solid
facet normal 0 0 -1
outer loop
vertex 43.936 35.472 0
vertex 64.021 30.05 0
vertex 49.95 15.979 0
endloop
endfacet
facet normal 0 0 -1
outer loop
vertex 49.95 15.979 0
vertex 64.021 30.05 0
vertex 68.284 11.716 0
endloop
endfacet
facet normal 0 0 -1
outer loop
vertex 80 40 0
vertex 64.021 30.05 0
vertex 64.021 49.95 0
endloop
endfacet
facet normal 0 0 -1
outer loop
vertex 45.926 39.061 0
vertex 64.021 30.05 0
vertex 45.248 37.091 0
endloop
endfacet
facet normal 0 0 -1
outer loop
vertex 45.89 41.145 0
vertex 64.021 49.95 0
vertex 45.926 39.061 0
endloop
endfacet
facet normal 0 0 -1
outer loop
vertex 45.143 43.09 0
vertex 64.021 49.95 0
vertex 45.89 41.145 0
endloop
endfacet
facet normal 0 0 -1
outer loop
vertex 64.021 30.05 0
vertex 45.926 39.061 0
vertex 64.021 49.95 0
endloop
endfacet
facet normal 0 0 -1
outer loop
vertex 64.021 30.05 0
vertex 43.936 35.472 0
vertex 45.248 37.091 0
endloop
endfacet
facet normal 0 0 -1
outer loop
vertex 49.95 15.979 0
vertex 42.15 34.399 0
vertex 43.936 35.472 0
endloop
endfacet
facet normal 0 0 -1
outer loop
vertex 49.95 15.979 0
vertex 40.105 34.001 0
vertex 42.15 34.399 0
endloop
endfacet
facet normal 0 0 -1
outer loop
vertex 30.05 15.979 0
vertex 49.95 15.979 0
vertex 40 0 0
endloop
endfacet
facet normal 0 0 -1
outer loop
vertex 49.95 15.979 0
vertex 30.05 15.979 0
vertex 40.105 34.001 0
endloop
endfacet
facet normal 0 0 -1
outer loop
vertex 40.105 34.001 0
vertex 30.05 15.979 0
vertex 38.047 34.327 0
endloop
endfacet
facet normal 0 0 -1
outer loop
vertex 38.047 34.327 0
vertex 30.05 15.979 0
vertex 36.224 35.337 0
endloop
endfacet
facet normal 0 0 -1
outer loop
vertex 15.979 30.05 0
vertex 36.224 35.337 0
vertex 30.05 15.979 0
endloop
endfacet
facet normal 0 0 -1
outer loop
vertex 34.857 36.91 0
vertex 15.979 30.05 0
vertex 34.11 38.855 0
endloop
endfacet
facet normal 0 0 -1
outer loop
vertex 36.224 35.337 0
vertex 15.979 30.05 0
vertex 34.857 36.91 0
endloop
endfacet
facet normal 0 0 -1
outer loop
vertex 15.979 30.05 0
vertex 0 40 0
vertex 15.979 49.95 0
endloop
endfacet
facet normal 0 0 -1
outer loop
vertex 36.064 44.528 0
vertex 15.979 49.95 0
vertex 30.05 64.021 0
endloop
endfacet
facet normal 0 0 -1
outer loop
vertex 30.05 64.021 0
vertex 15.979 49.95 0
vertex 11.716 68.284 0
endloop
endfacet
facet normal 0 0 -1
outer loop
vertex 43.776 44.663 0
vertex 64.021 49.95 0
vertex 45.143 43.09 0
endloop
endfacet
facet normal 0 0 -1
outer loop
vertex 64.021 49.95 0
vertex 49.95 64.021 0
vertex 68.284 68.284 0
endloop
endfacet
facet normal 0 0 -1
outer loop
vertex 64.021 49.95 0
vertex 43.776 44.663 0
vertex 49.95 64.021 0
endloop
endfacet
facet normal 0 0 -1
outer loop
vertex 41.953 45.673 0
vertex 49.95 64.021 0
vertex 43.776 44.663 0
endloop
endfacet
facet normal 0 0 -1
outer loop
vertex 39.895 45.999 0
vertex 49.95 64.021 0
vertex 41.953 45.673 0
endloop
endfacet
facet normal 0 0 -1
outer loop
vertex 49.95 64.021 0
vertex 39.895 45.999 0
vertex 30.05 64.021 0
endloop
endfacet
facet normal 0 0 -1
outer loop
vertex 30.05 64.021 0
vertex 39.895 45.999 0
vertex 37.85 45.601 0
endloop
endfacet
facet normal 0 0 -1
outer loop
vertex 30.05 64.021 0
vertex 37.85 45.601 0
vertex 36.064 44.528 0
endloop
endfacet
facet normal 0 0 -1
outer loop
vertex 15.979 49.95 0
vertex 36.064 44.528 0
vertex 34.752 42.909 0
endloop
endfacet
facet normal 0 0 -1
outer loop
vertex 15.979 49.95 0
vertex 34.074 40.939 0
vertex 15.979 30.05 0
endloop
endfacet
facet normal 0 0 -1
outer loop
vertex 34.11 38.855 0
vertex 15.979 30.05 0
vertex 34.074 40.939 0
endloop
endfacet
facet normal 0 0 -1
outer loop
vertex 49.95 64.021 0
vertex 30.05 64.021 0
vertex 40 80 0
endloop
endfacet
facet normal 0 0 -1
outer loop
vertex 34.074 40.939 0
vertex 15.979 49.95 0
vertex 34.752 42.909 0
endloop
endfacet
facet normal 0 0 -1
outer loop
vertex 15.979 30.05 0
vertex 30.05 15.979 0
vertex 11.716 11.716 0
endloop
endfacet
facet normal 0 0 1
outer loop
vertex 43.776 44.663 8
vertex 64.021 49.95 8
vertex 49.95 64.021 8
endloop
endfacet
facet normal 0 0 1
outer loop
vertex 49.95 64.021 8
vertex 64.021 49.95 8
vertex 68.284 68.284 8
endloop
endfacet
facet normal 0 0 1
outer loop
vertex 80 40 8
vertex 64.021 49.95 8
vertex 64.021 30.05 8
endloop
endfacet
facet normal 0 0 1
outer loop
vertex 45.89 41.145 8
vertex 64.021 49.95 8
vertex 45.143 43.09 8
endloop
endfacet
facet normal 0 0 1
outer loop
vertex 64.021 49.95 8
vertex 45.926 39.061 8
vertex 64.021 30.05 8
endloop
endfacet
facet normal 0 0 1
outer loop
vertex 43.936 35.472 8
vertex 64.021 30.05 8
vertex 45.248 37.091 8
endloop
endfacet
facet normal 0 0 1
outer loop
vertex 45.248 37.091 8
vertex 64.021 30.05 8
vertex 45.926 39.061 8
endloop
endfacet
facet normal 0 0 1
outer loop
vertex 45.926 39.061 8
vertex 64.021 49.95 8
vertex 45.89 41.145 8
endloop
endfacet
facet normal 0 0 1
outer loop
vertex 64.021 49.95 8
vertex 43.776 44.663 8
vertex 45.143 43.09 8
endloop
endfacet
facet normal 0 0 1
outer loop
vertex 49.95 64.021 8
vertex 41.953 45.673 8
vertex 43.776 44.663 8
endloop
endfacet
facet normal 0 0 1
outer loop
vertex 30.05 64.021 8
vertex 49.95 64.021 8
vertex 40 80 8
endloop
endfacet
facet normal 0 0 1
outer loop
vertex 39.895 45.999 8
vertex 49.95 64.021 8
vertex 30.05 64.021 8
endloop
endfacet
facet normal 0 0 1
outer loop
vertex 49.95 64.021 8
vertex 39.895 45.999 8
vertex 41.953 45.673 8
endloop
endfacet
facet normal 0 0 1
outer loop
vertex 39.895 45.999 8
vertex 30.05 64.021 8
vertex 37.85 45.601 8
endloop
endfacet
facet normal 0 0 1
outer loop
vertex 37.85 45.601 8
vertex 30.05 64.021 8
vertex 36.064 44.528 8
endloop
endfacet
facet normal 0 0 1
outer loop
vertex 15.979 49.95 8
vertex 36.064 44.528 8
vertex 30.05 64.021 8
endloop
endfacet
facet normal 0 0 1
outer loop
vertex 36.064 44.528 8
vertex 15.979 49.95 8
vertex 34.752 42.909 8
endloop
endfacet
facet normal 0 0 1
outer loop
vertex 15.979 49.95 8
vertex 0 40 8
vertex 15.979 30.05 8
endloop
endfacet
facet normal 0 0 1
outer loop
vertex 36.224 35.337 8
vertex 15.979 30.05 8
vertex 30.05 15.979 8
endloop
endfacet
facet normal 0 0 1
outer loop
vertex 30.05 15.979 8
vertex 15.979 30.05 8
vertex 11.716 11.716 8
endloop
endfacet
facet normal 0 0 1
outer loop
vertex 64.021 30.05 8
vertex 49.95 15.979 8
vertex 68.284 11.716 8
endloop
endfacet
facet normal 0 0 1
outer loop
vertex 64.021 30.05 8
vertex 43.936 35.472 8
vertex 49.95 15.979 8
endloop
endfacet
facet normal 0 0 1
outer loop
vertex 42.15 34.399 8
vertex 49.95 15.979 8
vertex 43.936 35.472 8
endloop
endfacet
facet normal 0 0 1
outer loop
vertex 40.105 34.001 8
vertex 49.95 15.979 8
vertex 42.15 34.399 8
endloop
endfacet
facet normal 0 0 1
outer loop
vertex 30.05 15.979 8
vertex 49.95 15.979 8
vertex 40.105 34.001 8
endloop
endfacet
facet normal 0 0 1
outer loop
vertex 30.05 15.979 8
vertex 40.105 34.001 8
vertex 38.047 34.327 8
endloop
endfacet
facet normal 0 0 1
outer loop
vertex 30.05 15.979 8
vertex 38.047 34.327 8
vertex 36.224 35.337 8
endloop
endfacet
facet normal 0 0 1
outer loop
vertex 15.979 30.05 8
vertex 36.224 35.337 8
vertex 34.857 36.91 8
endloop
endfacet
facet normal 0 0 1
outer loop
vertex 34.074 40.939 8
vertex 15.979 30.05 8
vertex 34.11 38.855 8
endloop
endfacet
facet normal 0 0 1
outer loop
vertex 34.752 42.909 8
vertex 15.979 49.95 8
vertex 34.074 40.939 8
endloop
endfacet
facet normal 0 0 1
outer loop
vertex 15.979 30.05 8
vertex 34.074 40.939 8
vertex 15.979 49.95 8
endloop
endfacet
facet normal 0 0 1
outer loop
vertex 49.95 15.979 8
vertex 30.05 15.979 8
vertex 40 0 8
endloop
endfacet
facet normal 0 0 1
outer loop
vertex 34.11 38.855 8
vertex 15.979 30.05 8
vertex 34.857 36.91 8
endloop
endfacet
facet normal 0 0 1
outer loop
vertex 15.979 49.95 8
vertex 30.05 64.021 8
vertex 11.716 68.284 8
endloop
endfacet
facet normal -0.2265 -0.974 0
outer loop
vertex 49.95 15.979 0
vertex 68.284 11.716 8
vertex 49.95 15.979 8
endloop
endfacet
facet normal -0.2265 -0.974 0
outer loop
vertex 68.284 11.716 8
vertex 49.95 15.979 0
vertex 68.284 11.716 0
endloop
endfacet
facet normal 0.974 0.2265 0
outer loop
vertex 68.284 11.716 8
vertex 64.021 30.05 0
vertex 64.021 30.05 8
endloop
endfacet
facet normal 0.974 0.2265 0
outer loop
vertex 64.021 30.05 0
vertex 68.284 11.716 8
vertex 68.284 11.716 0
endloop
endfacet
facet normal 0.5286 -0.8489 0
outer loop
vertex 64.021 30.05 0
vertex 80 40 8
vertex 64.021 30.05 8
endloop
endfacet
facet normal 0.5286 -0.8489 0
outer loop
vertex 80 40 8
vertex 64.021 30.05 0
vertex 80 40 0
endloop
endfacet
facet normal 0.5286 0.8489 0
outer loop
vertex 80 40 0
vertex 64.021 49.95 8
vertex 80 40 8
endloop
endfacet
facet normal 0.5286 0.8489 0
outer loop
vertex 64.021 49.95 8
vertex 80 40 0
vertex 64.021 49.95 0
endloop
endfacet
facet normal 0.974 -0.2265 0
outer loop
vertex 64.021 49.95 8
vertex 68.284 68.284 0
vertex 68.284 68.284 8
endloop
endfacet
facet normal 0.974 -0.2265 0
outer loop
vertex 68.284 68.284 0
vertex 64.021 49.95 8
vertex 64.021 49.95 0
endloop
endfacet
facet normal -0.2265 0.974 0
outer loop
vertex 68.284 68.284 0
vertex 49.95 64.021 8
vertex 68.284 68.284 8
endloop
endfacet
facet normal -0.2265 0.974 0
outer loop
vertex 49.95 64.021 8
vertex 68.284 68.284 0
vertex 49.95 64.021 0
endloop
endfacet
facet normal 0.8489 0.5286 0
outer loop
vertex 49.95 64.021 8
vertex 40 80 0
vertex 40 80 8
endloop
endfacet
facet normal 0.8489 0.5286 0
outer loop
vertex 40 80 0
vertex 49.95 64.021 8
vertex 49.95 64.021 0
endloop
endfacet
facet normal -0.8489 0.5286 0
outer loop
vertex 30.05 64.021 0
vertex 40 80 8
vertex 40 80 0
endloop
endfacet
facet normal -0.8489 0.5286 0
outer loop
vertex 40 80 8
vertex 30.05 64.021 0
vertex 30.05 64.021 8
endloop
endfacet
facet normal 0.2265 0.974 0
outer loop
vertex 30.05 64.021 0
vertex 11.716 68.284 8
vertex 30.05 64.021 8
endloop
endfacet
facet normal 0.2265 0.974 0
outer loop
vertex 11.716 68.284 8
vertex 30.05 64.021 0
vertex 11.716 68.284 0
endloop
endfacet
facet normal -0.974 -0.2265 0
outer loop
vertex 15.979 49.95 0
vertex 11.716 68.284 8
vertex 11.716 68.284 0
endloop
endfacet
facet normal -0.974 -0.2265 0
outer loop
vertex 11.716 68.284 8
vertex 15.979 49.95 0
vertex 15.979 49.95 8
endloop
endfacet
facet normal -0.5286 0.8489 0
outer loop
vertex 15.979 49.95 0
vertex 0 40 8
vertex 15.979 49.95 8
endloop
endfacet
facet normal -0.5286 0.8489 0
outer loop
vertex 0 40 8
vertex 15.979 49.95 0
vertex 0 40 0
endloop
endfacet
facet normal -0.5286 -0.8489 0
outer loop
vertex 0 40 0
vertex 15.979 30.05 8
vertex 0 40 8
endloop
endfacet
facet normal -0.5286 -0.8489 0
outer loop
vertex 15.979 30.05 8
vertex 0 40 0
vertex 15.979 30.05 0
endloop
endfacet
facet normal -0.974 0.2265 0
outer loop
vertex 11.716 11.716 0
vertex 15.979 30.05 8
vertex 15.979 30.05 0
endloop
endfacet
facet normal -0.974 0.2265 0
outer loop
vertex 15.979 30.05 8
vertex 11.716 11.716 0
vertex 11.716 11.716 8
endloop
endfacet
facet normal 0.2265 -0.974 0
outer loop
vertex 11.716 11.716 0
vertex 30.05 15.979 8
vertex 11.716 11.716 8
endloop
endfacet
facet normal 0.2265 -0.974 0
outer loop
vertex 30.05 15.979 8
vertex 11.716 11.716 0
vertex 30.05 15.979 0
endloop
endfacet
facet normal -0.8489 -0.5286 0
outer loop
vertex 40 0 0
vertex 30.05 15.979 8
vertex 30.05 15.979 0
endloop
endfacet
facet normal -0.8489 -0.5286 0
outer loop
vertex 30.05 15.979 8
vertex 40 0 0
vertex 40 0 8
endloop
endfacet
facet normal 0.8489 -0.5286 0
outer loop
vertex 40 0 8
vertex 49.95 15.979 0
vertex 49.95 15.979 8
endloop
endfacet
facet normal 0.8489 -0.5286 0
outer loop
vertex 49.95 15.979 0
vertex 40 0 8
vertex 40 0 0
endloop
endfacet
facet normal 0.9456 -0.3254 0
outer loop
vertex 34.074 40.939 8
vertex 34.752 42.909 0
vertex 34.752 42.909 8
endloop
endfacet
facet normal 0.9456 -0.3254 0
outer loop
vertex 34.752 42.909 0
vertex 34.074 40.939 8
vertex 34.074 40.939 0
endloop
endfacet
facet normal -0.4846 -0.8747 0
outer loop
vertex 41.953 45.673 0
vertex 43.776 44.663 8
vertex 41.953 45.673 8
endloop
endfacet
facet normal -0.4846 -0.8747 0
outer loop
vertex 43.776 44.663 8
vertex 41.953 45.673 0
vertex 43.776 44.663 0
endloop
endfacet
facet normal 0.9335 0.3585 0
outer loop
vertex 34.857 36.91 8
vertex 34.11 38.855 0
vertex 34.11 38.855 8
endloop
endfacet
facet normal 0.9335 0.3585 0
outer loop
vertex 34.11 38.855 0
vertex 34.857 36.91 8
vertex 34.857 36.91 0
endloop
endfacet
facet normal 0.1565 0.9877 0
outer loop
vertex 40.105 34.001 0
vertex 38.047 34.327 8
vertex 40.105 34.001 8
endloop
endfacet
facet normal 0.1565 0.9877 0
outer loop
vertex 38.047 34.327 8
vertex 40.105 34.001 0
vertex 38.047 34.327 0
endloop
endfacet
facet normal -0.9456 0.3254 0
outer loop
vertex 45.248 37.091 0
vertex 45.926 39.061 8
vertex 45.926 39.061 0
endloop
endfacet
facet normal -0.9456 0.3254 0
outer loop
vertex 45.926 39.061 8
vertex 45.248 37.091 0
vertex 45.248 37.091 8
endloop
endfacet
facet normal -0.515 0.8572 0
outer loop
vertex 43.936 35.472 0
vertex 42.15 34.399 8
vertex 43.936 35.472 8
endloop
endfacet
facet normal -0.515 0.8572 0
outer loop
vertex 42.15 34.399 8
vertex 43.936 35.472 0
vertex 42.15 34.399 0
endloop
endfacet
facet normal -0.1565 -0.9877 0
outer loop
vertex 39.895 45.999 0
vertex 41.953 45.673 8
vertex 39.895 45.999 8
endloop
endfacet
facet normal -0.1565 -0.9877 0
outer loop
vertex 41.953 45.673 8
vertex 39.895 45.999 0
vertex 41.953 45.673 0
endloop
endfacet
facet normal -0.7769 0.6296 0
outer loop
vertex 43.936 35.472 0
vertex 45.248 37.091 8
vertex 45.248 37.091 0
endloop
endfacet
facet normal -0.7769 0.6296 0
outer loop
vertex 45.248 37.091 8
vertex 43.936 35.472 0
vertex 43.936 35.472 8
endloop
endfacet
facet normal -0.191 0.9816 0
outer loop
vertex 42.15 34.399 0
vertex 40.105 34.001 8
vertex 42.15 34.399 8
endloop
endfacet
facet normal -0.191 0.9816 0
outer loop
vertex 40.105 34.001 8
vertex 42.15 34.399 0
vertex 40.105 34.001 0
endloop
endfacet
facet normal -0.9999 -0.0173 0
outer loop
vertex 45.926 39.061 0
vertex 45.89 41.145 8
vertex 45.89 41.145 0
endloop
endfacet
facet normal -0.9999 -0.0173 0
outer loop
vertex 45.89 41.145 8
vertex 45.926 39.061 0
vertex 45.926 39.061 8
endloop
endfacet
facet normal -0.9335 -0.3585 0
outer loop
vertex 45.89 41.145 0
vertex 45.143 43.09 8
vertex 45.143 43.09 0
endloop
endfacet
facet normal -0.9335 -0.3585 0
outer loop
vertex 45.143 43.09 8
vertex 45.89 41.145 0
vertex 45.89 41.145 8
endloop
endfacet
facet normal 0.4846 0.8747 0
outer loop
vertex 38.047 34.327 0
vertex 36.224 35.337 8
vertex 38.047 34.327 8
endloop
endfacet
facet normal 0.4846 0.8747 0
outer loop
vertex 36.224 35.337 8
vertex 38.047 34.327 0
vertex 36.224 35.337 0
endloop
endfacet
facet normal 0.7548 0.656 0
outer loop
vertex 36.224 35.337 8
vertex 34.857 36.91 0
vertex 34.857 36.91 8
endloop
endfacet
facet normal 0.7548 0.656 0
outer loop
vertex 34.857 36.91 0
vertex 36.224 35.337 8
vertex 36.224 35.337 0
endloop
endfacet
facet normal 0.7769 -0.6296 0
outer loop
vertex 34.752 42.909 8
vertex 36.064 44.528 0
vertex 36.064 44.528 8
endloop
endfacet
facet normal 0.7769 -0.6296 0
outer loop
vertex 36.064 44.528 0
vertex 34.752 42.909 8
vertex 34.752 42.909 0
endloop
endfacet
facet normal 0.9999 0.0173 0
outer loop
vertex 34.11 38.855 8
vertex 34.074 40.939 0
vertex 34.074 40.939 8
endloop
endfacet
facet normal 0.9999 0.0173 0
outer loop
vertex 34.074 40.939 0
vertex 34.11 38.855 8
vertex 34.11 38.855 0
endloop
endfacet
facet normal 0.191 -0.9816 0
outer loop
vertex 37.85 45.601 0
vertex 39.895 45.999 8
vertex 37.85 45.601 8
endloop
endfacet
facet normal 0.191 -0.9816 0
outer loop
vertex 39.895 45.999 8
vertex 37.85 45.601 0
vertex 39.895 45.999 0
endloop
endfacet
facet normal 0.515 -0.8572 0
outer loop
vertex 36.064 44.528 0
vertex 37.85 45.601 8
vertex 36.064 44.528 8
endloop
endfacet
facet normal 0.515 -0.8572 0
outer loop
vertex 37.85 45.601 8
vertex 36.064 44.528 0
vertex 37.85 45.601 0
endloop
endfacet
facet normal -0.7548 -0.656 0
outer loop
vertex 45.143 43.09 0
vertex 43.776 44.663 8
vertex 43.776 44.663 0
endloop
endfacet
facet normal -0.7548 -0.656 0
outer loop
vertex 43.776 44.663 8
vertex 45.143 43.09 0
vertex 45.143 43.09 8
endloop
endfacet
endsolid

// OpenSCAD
$fn = 32;

// ----------------------------------------------------------------------
// Star wheel: 8-point blunt, R40
// ----------------------------------------------------------------------

// --- parameters (mm) ---
n_points = 8;             // number of points / teeth
r_out = 40;               // tip radius
r_in = 26;                // root radius
bore_r = 6;               // centre bore radius
plate_t = 8;              // plate thickness, Z (extrusion height)
bore_d = 12;              // centre bore diameter

profile = [[0, 40], [15.979, 30.05], [11.716, 11.716], [30.05, 15.979], [40, 0], [49.95, 15.979], [68.284, 11.716], [64.021, 30.05], [80, 40], [64.021, 49.95], [68.284, 68.284], [49.95, 64.021], [40, 80], [30.05, 64.021], [11.716, 68.284], [15.979, 49.95]];  // primary outline, 16 points, counter clockwise
void_1 = [[45.89, 41.145], [45.143, 43.09], [43.776, 44.663], [41.953, 45.673], [39.895, 45.999], [37.85, 45.601], [36.064, 44.528], [34.752, 42.909], [34.074, 40.939], [34.11, 38.855], [34.857, 36.91], [36.224, 35.337], [38.047, 34.327], [40.105, 34.001], [42.15, 34.399], [43.936, 35.472], [45.248, 37.091], [45.926, 39.061]];  // centre bore, 18 points

// --- the one profile operation ---
difference() {
  linear_extrude(height = plate_t) polygon(points = profile);
  translate([0, 0, -1])
    linear_extrude(height = plate_t + 2) polygon(points = void_1);
}
